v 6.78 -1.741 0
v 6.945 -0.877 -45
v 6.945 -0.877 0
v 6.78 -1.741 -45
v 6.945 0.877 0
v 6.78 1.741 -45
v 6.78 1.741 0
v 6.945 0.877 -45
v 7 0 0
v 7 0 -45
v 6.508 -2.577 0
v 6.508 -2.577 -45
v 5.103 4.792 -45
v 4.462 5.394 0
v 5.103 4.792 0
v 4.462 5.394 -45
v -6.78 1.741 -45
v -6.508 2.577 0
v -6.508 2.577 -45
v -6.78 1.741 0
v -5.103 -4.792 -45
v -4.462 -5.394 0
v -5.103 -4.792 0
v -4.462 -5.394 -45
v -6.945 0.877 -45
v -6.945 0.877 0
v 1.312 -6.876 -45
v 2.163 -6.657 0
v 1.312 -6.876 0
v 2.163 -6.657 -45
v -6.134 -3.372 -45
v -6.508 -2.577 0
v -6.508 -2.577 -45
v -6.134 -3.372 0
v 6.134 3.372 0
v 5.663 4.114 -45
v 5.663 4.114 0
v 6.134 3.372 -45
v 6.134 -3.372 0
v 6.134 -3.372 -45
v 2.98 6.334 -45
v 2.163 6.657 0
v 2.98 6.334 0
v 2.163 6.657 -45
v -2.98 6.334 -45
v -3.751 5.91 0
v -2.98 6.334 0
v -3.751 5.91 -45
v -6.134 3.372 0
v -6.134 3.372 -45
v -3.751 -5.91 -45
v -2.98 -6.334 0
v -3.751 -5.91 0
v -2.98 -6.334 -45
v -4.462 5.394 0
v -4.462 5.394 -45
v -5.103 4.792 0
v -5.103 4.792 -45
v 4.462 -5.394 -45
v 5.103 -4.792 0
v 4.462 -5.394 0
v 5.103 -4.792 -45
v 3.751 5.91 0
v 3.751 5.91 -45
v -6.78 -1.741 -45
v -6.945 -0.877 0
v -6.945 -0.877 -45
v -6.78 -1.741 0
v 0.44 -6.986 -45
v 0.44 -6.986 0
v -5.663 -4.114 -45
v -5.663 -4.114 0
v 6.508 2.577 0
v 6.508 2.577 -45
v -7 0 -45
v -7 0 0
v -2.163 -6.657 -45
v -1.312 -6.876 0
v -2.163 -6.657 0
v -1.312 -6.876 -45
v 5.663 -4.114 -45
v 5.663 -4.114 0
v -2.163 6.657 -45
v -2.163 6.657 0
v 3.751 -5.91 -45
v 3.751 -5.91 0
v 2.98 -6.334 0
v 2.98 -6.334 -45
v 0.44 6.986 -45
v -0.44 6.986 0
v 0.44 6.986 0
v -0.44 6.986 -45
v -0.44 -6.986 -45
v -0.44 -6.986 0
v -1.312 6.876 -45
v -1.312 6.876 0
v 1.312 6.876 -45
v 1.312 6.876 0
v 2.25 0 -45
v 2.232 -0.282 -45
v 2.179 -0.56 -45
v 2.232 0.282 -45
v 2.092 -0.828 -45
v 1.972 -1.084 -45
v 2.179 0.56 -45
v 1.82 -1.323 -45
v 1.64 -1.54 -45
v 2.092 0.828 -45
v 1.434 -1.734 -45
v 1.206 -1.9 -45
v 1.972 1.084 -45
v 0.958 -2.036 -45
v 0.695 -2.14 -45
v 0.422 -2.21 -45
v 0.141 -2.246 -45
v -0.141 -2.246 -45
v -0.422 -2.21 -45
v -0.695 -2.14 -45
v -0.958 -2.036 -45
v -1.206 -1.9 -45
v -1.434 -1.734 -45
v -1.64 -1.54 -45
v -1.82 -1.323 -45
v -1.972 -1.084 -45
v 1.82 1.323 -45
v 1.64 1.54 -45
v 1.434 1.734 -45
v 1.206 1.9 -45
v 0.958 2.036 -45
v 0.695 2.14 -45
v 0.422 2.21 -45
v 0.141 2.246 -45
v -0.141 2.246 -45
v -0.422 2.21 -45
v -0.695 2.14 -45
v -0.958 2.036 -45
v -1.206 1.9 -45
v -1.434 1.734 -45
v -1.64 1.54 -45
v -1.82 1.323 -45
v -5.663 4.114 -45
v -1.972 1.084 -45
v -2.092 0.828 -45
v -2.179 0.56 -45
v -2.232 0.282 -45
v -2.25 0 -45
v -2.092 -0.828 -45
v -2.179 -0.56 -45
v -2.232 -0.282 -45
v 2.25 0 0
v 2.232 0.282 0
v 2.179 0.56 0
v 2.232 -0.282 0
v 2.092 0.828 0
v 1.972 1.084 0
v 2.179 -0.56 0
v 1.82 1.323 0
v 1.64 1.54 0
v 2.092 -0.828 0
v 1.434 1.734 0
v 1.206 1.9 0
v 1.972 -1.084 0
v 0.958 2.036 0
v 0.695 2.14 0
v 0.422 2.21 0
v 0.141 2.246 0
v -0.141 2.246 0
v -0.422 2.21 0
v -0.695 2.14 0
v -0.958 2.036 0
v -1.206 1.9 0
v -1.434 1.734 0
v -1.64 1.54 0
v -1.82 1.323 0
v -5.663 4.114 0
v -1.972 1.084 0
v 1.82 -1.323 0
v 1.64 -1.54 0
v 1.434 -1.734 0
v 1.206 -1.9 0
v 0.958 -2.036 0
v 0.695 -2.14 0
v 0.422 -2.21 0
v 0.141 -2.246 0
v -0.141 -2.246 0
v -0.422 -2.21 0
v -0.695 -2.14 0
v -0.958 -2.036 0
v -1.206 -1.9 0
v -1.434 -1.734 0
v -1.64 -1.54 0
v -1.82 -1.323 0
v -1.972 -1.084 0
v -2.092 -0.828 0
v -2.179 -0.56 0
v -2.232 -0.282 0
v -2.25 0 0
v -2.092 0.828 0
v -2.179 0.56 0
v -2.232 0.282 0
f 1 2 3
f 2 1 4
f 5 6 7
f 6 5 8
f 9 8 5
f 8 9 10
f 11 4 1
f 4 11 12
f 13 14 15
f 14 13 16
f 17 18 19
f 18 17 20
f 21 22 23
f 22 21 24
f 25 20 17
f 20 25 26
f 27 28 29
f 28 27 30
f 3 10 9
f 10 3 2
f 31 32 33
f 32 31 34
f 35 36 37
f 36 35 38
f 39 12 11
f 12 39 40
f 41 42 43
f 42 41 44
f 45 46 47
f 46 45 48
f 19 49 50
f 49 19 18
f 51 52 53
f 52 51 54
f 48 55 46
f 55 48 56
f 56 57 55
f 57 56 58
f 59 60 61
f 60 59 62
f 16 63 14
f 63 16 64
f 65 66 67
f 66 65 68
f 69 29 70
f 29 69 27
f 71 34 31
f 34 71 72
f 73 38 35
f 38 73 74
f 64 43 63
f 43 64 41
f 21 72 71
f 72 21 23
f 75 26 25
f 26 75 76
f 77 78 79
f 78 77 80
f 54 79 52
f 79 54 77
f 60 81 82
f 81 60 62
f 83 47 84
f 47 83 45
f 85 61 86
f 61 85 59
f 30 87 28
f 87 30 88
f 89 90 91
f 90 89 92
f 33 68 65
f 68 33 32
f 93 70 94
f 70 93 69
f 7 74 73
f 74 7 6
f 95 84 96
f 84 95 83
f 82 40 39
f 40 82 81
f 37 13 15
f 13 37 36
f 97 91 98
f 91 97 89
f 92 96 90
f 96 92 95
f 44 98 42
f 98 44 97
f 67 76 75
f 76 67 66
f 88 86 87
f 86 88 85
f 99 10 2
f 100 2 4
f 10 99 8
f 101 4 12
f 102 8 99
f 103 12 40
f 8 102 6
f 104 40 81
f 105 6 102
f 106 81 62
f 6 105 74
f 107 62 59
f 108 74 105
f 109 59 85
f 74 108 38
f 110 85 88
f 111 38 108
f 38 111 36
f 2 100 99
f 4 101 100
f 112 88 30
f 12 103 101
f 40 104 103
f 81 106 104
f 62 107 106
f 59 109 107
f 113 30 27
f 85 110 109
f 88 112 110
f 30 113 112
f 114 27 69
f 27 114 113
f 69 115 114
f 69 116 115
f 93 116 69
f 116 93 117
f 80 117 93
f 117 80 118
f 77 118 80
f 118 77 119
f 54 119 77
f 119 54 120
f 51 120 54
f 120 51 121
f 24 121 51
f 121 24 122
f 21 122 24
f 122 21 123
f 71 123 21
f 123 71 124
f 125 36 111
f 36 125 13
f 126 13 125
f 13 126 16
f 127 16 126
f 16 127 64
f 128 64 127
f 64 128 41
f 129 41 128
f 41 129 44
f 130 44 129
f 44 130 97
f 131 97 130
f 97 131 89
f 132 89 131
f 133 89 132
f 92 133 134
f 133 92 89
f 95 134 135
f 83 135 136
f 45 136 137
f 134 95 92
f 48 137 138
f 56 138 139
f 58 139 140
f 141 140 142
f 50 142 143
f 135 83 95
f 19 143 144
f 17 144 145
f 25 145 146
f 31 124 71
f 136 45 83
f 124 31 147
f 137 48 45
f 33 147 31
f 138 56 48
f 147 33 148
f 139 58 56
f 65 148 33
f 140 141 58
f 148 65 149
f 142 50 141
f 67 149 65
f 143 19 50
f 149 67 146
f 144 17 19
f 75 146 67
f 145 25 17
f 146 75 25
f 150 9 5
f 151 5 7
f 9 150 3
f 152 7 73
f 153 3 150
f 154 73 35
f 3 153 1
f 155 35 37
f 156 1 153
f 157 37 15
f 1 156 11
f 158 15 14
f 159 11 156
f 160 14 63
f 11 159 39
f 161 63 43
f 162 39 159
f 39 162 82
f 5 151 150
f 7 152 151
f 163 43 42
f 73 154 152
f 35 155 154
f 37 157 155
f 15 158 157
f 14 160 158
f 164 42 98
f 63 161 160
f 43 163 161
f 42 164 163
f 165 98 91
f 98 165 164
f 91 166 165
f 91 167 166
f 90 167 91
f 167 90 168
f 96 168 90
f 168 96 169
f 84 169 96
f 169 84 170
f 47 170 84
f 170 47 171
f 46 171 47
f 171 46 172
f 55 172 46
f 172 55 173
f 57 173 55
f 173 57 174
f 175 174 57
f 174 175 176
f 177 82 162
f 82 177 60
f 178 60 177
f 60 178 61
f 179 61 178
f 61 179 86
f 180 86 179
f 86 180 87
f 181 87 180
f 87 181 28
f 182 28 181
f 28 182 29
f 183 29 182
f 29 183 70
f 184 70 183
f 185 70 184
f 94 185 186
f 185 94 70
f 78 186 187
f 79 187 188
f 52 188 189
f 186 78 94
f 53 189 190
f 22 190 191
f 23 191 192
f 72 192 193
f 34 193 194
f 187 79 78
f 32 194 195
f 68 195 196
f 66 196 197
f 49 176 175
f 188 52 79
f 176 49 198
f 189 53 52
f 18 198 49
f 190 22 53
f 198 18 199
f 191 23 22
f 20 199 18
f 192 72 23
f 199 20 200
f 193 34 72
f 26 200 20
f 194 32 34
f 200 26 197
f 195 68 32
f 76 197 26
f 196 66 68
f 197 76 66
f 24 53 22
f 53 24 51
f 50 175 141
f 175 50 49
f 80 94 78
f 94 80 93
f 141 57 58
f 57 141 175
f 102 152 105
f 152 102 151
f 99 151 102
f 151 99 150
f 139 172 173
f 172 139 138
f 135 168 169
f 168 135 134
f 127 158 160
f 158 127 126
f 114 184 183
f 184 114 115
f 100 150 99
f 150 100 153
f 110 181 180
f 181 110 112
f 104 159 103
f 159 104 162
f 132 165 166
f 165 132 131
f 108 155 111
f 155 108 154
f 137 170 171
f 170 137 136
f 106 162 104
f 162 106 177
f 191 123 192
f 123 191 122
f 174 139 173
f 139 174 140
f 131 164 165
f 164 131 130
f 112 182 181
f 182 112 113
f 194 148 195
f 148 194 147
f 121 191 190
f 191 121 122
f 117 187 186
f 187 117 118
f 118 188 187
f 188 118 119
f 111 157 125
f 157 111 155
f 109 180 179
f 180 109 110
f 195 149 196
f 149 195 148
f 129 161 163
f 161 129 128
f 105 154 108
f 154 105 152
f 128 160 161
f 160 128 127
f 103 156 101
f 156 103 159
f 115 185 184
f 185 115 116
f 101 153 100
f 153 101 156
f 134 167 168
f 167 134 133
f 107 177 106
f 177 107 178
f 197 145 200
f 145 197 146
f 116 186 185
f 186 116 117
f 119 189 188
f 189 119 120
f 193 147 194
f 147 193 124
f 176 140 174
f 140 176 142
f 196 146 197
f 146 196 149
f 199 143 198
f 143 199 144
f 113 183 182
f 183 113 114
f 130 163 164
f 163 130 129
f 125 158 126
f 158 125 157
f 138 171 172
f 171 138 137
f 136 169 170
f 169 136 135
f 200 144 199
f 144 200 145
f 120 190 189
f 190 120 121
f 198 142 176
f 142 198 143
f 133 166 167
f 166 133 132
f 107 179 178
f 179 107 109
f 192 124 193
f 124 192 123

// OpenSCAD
$fn = 50;


difference() {
	union() {
		translate(v = [0, 0, -45.0000000000]) {
			cylinder(h = 45, r = 7.0000000000);
		}
		cylinder(h = 0, r = 16.0000000000);
	}
	union() {
		#translate(v = [0, 0, -45]) {
			cylinder(h = 45, r = 2.2500000000);
		}
	}
}
